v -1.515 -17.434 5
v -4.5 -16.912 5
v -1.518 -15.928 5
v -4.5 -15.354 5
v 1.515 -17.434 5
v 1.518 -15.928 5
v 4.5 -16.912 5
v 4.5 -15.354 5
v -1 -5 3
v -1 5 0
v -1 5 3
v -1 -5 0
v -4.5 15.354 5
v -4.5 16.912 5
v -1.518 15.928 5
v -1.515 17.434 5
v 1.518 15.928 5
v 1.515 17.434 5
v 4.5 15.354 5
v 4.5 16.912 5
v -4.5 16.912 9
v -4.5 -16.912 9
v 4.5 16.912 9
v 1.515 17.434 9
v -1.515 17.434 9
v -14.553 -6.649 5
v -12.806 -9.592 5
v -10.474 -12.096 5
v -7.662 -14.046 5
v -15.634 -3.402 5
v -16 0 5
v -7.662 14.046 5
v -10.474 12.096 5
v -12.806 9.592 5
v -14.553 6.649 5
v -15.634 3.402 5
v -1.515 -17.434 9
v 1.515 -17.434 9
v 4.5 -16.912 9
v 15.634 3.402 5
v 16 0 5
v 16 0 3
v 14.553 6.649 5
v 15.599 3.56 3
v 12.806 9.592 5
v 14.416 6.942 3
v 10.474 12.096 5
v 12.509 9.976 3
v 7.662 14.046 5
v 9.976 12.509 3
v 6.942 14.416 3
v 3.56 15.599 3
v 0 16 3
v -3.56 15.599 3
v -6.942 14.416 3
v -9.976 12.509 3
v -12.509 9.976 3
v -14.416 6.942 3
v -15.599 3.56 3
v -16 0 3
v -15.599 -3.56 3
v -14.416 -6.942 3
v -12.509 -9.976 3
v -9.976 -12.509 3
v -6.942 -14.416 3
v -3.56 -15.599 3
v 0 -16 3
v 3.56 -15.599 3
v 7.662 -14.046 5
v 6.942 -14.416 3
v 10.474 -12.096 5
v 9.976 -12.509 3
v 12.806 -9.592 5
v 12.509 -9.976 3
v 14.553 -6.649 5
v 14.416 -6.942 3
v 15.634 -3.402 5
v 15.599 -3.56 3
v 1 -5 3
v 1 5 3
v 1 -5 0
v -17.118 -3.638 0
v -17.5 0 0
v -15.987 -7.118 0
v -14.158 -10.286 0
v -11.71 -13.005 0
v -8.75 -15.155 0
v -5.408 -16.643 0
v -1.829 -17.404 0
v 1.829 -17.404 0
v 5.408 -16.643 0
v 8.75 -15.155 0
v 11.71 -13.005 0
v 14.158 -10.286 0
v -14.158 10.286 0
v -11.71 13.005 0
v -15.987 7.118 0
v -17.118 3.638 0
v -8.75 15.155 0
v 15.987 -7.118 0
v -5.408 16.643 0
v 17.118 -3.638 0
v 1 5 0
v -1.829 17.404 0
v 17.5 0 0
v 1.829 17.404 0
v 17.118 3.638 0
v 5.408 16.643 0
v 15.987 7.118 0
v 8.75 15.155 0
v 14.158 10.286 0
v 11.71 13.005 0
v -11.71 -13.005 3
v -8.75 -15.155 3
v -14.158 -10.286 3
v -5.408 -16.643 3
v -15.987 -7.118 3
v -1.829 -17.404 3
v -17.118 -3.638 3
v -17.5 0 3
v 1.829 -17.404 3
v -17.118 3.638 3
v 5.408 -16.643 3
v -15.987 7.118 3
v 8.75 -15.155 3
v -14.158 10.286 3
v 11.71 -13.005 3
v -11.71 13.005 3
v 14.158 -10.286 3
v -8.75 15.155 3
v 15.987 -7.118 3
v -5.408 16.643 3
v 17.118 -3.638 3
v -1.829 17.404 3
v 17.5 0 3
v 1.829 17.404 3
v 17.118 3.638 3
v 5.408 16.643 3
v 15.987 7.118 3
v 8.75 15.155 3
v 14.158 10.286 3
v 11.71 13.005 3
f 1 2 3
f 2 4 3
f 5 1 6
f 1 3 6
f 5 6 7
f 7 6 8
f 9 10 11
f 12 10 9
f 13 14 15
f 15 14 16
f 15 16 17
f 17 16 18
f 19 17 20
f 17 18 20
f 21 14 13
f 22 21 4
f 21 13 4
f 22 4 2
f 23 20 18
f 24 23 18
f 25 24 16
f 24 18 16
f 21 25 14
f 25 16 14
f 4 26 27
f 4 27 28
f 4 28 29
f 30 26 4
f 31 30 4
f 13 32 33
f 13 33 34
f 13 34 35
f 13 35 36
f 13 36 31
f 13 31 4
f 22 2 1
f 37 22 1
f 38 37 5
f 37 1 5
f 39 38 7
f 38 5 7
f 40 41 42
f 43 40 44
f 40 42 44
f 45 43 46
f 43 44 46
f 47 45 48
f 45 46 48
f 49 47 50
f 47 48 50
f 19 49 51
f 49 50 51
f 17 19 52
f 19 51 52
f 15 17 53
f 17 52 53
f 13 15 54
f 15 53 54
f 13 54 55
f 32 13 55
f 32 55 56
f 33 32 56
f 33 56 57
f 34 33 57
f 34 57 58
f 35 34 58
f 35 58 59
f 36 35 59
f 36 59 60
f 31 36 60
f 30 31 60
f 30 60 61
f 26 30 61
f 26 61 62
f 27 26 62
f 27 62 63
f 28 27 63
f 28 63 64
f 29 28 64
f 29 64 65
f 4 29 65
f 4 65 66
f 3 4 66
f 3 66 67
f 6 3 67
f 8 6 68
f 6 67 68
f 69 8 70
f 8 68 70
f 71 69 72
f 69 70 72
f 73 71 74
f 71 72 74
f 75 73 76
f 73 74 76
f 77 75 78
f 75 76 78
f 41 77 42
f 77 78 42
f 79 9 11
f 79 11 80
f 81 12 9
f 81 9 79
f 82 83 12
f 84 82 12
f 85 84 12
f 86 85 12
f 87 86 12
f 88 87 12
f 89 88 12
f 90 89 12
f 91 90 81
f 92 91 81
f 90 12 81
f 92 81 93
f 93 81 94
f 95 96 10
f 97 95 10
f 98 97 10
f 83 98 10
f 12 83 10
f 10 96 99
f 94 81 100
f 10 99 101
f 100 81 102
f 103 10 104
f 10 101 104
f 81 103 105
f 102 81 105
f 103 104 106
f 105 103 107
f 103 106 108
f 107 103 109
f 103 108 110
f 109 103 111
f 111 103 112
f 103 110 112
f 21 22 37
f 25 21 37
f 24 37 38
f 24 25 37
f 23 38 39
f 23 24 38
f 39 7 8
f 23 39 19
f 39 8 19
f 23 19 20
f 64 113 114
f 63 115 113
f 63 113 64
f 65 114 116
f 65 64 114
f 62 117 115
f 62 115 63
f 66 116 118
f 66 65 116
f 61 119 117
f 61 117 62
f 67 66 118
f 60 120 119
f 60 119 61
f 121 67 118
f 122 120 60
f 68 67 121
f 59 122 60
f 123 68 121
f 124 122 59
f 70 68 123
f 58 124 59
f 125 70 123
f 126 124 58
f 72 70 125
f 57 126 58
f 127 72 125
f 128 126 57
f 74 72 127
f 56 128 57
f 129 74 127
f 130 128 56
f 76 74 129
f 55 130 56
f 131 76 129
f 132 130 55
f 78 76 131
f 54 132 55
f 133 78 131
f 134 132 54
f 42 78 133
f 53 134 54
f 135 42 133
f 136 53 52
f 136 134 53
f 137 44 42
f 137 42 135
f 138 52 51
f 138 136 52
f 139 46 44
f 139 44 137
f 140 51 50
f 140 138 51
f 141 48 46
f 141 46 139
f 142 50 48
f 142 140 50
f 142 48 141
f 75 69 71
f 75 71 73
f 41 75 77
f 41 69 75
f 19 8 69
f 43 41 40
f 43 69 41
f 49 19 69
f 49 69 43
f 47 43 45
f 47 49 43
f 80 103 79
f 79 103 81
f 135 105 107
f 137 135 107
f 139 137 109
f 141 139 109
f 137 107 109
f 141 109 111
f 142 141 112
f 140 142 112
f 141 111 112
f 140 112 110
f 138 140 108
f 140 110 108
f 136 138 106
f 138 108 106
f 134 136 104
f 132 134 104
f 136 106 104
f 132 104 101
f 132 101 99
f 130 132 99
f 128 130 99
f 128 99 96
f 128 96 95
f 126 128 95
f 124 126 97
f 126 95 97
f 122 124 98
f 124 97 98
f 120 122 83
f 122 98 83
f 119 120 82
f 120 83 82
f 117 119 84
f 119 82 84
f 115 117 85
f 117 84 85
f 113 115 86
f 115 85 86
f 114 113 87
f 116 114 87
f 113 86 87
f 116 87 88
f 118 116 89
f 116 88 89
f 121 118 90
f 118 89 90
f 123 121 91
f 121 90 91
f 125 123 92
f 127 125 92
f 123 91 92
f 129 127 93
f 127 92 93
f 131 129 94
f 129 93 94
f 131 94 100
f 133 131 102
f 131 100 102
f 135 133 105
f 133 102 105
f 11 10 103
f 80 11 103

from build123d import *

# Parameters (mm, degrees)
F0_R     = 17.5
F1_DEPTH = 3
F2_R     = 16
F3_DEPTH = 2
F5_DEPTH = 4
F6_W     = 2
F6_H     = 10
F7_DEPTH = 3


with BuildPart() as f1:
    # F0 (on Top) → F1 (new body)
    with BuildSketch(Plane.XY):
        Circle(F0_R)
    extrude(amount=F1_DEPTH)

    # F2 (on face) → F3 (join)
    with BuildSketch(Plane.XY.offset(3)):
        Circle(F2_R)
    extrude(amount=F3_DEPTH)

    # F4 (on face) → F5 (join)
    with BuildSketch(Plane.XY.offset(5)):
        with BuildLine():
            Line((4.5, -16.911535), (4.5, 16.911535))
            ThreePointArc((4.5, 16.911535), (0, 17.5), (-4.5, 16.911535))
            Line((-4.5, 16.911535), (-4.5, -16.911535))
            ThreePointArc((-4.5, -16.911535), (0, -17.5), (4.5, -16.911535))
        make_face()
    extrude(amount=F5_DEPTH)

    # F6 (on face) → F7 (cut)
    with BuildSketch(Plane(origin=(0, 0, 0), x_dir=(1, 0, 0), z_dir=(0, 0, -1))):
        Rectangle(F6_W, F6_H)
    extrude(amount=-F7_DEPTH, mode=Mode.SUBTRACT)


solid = f1.part
